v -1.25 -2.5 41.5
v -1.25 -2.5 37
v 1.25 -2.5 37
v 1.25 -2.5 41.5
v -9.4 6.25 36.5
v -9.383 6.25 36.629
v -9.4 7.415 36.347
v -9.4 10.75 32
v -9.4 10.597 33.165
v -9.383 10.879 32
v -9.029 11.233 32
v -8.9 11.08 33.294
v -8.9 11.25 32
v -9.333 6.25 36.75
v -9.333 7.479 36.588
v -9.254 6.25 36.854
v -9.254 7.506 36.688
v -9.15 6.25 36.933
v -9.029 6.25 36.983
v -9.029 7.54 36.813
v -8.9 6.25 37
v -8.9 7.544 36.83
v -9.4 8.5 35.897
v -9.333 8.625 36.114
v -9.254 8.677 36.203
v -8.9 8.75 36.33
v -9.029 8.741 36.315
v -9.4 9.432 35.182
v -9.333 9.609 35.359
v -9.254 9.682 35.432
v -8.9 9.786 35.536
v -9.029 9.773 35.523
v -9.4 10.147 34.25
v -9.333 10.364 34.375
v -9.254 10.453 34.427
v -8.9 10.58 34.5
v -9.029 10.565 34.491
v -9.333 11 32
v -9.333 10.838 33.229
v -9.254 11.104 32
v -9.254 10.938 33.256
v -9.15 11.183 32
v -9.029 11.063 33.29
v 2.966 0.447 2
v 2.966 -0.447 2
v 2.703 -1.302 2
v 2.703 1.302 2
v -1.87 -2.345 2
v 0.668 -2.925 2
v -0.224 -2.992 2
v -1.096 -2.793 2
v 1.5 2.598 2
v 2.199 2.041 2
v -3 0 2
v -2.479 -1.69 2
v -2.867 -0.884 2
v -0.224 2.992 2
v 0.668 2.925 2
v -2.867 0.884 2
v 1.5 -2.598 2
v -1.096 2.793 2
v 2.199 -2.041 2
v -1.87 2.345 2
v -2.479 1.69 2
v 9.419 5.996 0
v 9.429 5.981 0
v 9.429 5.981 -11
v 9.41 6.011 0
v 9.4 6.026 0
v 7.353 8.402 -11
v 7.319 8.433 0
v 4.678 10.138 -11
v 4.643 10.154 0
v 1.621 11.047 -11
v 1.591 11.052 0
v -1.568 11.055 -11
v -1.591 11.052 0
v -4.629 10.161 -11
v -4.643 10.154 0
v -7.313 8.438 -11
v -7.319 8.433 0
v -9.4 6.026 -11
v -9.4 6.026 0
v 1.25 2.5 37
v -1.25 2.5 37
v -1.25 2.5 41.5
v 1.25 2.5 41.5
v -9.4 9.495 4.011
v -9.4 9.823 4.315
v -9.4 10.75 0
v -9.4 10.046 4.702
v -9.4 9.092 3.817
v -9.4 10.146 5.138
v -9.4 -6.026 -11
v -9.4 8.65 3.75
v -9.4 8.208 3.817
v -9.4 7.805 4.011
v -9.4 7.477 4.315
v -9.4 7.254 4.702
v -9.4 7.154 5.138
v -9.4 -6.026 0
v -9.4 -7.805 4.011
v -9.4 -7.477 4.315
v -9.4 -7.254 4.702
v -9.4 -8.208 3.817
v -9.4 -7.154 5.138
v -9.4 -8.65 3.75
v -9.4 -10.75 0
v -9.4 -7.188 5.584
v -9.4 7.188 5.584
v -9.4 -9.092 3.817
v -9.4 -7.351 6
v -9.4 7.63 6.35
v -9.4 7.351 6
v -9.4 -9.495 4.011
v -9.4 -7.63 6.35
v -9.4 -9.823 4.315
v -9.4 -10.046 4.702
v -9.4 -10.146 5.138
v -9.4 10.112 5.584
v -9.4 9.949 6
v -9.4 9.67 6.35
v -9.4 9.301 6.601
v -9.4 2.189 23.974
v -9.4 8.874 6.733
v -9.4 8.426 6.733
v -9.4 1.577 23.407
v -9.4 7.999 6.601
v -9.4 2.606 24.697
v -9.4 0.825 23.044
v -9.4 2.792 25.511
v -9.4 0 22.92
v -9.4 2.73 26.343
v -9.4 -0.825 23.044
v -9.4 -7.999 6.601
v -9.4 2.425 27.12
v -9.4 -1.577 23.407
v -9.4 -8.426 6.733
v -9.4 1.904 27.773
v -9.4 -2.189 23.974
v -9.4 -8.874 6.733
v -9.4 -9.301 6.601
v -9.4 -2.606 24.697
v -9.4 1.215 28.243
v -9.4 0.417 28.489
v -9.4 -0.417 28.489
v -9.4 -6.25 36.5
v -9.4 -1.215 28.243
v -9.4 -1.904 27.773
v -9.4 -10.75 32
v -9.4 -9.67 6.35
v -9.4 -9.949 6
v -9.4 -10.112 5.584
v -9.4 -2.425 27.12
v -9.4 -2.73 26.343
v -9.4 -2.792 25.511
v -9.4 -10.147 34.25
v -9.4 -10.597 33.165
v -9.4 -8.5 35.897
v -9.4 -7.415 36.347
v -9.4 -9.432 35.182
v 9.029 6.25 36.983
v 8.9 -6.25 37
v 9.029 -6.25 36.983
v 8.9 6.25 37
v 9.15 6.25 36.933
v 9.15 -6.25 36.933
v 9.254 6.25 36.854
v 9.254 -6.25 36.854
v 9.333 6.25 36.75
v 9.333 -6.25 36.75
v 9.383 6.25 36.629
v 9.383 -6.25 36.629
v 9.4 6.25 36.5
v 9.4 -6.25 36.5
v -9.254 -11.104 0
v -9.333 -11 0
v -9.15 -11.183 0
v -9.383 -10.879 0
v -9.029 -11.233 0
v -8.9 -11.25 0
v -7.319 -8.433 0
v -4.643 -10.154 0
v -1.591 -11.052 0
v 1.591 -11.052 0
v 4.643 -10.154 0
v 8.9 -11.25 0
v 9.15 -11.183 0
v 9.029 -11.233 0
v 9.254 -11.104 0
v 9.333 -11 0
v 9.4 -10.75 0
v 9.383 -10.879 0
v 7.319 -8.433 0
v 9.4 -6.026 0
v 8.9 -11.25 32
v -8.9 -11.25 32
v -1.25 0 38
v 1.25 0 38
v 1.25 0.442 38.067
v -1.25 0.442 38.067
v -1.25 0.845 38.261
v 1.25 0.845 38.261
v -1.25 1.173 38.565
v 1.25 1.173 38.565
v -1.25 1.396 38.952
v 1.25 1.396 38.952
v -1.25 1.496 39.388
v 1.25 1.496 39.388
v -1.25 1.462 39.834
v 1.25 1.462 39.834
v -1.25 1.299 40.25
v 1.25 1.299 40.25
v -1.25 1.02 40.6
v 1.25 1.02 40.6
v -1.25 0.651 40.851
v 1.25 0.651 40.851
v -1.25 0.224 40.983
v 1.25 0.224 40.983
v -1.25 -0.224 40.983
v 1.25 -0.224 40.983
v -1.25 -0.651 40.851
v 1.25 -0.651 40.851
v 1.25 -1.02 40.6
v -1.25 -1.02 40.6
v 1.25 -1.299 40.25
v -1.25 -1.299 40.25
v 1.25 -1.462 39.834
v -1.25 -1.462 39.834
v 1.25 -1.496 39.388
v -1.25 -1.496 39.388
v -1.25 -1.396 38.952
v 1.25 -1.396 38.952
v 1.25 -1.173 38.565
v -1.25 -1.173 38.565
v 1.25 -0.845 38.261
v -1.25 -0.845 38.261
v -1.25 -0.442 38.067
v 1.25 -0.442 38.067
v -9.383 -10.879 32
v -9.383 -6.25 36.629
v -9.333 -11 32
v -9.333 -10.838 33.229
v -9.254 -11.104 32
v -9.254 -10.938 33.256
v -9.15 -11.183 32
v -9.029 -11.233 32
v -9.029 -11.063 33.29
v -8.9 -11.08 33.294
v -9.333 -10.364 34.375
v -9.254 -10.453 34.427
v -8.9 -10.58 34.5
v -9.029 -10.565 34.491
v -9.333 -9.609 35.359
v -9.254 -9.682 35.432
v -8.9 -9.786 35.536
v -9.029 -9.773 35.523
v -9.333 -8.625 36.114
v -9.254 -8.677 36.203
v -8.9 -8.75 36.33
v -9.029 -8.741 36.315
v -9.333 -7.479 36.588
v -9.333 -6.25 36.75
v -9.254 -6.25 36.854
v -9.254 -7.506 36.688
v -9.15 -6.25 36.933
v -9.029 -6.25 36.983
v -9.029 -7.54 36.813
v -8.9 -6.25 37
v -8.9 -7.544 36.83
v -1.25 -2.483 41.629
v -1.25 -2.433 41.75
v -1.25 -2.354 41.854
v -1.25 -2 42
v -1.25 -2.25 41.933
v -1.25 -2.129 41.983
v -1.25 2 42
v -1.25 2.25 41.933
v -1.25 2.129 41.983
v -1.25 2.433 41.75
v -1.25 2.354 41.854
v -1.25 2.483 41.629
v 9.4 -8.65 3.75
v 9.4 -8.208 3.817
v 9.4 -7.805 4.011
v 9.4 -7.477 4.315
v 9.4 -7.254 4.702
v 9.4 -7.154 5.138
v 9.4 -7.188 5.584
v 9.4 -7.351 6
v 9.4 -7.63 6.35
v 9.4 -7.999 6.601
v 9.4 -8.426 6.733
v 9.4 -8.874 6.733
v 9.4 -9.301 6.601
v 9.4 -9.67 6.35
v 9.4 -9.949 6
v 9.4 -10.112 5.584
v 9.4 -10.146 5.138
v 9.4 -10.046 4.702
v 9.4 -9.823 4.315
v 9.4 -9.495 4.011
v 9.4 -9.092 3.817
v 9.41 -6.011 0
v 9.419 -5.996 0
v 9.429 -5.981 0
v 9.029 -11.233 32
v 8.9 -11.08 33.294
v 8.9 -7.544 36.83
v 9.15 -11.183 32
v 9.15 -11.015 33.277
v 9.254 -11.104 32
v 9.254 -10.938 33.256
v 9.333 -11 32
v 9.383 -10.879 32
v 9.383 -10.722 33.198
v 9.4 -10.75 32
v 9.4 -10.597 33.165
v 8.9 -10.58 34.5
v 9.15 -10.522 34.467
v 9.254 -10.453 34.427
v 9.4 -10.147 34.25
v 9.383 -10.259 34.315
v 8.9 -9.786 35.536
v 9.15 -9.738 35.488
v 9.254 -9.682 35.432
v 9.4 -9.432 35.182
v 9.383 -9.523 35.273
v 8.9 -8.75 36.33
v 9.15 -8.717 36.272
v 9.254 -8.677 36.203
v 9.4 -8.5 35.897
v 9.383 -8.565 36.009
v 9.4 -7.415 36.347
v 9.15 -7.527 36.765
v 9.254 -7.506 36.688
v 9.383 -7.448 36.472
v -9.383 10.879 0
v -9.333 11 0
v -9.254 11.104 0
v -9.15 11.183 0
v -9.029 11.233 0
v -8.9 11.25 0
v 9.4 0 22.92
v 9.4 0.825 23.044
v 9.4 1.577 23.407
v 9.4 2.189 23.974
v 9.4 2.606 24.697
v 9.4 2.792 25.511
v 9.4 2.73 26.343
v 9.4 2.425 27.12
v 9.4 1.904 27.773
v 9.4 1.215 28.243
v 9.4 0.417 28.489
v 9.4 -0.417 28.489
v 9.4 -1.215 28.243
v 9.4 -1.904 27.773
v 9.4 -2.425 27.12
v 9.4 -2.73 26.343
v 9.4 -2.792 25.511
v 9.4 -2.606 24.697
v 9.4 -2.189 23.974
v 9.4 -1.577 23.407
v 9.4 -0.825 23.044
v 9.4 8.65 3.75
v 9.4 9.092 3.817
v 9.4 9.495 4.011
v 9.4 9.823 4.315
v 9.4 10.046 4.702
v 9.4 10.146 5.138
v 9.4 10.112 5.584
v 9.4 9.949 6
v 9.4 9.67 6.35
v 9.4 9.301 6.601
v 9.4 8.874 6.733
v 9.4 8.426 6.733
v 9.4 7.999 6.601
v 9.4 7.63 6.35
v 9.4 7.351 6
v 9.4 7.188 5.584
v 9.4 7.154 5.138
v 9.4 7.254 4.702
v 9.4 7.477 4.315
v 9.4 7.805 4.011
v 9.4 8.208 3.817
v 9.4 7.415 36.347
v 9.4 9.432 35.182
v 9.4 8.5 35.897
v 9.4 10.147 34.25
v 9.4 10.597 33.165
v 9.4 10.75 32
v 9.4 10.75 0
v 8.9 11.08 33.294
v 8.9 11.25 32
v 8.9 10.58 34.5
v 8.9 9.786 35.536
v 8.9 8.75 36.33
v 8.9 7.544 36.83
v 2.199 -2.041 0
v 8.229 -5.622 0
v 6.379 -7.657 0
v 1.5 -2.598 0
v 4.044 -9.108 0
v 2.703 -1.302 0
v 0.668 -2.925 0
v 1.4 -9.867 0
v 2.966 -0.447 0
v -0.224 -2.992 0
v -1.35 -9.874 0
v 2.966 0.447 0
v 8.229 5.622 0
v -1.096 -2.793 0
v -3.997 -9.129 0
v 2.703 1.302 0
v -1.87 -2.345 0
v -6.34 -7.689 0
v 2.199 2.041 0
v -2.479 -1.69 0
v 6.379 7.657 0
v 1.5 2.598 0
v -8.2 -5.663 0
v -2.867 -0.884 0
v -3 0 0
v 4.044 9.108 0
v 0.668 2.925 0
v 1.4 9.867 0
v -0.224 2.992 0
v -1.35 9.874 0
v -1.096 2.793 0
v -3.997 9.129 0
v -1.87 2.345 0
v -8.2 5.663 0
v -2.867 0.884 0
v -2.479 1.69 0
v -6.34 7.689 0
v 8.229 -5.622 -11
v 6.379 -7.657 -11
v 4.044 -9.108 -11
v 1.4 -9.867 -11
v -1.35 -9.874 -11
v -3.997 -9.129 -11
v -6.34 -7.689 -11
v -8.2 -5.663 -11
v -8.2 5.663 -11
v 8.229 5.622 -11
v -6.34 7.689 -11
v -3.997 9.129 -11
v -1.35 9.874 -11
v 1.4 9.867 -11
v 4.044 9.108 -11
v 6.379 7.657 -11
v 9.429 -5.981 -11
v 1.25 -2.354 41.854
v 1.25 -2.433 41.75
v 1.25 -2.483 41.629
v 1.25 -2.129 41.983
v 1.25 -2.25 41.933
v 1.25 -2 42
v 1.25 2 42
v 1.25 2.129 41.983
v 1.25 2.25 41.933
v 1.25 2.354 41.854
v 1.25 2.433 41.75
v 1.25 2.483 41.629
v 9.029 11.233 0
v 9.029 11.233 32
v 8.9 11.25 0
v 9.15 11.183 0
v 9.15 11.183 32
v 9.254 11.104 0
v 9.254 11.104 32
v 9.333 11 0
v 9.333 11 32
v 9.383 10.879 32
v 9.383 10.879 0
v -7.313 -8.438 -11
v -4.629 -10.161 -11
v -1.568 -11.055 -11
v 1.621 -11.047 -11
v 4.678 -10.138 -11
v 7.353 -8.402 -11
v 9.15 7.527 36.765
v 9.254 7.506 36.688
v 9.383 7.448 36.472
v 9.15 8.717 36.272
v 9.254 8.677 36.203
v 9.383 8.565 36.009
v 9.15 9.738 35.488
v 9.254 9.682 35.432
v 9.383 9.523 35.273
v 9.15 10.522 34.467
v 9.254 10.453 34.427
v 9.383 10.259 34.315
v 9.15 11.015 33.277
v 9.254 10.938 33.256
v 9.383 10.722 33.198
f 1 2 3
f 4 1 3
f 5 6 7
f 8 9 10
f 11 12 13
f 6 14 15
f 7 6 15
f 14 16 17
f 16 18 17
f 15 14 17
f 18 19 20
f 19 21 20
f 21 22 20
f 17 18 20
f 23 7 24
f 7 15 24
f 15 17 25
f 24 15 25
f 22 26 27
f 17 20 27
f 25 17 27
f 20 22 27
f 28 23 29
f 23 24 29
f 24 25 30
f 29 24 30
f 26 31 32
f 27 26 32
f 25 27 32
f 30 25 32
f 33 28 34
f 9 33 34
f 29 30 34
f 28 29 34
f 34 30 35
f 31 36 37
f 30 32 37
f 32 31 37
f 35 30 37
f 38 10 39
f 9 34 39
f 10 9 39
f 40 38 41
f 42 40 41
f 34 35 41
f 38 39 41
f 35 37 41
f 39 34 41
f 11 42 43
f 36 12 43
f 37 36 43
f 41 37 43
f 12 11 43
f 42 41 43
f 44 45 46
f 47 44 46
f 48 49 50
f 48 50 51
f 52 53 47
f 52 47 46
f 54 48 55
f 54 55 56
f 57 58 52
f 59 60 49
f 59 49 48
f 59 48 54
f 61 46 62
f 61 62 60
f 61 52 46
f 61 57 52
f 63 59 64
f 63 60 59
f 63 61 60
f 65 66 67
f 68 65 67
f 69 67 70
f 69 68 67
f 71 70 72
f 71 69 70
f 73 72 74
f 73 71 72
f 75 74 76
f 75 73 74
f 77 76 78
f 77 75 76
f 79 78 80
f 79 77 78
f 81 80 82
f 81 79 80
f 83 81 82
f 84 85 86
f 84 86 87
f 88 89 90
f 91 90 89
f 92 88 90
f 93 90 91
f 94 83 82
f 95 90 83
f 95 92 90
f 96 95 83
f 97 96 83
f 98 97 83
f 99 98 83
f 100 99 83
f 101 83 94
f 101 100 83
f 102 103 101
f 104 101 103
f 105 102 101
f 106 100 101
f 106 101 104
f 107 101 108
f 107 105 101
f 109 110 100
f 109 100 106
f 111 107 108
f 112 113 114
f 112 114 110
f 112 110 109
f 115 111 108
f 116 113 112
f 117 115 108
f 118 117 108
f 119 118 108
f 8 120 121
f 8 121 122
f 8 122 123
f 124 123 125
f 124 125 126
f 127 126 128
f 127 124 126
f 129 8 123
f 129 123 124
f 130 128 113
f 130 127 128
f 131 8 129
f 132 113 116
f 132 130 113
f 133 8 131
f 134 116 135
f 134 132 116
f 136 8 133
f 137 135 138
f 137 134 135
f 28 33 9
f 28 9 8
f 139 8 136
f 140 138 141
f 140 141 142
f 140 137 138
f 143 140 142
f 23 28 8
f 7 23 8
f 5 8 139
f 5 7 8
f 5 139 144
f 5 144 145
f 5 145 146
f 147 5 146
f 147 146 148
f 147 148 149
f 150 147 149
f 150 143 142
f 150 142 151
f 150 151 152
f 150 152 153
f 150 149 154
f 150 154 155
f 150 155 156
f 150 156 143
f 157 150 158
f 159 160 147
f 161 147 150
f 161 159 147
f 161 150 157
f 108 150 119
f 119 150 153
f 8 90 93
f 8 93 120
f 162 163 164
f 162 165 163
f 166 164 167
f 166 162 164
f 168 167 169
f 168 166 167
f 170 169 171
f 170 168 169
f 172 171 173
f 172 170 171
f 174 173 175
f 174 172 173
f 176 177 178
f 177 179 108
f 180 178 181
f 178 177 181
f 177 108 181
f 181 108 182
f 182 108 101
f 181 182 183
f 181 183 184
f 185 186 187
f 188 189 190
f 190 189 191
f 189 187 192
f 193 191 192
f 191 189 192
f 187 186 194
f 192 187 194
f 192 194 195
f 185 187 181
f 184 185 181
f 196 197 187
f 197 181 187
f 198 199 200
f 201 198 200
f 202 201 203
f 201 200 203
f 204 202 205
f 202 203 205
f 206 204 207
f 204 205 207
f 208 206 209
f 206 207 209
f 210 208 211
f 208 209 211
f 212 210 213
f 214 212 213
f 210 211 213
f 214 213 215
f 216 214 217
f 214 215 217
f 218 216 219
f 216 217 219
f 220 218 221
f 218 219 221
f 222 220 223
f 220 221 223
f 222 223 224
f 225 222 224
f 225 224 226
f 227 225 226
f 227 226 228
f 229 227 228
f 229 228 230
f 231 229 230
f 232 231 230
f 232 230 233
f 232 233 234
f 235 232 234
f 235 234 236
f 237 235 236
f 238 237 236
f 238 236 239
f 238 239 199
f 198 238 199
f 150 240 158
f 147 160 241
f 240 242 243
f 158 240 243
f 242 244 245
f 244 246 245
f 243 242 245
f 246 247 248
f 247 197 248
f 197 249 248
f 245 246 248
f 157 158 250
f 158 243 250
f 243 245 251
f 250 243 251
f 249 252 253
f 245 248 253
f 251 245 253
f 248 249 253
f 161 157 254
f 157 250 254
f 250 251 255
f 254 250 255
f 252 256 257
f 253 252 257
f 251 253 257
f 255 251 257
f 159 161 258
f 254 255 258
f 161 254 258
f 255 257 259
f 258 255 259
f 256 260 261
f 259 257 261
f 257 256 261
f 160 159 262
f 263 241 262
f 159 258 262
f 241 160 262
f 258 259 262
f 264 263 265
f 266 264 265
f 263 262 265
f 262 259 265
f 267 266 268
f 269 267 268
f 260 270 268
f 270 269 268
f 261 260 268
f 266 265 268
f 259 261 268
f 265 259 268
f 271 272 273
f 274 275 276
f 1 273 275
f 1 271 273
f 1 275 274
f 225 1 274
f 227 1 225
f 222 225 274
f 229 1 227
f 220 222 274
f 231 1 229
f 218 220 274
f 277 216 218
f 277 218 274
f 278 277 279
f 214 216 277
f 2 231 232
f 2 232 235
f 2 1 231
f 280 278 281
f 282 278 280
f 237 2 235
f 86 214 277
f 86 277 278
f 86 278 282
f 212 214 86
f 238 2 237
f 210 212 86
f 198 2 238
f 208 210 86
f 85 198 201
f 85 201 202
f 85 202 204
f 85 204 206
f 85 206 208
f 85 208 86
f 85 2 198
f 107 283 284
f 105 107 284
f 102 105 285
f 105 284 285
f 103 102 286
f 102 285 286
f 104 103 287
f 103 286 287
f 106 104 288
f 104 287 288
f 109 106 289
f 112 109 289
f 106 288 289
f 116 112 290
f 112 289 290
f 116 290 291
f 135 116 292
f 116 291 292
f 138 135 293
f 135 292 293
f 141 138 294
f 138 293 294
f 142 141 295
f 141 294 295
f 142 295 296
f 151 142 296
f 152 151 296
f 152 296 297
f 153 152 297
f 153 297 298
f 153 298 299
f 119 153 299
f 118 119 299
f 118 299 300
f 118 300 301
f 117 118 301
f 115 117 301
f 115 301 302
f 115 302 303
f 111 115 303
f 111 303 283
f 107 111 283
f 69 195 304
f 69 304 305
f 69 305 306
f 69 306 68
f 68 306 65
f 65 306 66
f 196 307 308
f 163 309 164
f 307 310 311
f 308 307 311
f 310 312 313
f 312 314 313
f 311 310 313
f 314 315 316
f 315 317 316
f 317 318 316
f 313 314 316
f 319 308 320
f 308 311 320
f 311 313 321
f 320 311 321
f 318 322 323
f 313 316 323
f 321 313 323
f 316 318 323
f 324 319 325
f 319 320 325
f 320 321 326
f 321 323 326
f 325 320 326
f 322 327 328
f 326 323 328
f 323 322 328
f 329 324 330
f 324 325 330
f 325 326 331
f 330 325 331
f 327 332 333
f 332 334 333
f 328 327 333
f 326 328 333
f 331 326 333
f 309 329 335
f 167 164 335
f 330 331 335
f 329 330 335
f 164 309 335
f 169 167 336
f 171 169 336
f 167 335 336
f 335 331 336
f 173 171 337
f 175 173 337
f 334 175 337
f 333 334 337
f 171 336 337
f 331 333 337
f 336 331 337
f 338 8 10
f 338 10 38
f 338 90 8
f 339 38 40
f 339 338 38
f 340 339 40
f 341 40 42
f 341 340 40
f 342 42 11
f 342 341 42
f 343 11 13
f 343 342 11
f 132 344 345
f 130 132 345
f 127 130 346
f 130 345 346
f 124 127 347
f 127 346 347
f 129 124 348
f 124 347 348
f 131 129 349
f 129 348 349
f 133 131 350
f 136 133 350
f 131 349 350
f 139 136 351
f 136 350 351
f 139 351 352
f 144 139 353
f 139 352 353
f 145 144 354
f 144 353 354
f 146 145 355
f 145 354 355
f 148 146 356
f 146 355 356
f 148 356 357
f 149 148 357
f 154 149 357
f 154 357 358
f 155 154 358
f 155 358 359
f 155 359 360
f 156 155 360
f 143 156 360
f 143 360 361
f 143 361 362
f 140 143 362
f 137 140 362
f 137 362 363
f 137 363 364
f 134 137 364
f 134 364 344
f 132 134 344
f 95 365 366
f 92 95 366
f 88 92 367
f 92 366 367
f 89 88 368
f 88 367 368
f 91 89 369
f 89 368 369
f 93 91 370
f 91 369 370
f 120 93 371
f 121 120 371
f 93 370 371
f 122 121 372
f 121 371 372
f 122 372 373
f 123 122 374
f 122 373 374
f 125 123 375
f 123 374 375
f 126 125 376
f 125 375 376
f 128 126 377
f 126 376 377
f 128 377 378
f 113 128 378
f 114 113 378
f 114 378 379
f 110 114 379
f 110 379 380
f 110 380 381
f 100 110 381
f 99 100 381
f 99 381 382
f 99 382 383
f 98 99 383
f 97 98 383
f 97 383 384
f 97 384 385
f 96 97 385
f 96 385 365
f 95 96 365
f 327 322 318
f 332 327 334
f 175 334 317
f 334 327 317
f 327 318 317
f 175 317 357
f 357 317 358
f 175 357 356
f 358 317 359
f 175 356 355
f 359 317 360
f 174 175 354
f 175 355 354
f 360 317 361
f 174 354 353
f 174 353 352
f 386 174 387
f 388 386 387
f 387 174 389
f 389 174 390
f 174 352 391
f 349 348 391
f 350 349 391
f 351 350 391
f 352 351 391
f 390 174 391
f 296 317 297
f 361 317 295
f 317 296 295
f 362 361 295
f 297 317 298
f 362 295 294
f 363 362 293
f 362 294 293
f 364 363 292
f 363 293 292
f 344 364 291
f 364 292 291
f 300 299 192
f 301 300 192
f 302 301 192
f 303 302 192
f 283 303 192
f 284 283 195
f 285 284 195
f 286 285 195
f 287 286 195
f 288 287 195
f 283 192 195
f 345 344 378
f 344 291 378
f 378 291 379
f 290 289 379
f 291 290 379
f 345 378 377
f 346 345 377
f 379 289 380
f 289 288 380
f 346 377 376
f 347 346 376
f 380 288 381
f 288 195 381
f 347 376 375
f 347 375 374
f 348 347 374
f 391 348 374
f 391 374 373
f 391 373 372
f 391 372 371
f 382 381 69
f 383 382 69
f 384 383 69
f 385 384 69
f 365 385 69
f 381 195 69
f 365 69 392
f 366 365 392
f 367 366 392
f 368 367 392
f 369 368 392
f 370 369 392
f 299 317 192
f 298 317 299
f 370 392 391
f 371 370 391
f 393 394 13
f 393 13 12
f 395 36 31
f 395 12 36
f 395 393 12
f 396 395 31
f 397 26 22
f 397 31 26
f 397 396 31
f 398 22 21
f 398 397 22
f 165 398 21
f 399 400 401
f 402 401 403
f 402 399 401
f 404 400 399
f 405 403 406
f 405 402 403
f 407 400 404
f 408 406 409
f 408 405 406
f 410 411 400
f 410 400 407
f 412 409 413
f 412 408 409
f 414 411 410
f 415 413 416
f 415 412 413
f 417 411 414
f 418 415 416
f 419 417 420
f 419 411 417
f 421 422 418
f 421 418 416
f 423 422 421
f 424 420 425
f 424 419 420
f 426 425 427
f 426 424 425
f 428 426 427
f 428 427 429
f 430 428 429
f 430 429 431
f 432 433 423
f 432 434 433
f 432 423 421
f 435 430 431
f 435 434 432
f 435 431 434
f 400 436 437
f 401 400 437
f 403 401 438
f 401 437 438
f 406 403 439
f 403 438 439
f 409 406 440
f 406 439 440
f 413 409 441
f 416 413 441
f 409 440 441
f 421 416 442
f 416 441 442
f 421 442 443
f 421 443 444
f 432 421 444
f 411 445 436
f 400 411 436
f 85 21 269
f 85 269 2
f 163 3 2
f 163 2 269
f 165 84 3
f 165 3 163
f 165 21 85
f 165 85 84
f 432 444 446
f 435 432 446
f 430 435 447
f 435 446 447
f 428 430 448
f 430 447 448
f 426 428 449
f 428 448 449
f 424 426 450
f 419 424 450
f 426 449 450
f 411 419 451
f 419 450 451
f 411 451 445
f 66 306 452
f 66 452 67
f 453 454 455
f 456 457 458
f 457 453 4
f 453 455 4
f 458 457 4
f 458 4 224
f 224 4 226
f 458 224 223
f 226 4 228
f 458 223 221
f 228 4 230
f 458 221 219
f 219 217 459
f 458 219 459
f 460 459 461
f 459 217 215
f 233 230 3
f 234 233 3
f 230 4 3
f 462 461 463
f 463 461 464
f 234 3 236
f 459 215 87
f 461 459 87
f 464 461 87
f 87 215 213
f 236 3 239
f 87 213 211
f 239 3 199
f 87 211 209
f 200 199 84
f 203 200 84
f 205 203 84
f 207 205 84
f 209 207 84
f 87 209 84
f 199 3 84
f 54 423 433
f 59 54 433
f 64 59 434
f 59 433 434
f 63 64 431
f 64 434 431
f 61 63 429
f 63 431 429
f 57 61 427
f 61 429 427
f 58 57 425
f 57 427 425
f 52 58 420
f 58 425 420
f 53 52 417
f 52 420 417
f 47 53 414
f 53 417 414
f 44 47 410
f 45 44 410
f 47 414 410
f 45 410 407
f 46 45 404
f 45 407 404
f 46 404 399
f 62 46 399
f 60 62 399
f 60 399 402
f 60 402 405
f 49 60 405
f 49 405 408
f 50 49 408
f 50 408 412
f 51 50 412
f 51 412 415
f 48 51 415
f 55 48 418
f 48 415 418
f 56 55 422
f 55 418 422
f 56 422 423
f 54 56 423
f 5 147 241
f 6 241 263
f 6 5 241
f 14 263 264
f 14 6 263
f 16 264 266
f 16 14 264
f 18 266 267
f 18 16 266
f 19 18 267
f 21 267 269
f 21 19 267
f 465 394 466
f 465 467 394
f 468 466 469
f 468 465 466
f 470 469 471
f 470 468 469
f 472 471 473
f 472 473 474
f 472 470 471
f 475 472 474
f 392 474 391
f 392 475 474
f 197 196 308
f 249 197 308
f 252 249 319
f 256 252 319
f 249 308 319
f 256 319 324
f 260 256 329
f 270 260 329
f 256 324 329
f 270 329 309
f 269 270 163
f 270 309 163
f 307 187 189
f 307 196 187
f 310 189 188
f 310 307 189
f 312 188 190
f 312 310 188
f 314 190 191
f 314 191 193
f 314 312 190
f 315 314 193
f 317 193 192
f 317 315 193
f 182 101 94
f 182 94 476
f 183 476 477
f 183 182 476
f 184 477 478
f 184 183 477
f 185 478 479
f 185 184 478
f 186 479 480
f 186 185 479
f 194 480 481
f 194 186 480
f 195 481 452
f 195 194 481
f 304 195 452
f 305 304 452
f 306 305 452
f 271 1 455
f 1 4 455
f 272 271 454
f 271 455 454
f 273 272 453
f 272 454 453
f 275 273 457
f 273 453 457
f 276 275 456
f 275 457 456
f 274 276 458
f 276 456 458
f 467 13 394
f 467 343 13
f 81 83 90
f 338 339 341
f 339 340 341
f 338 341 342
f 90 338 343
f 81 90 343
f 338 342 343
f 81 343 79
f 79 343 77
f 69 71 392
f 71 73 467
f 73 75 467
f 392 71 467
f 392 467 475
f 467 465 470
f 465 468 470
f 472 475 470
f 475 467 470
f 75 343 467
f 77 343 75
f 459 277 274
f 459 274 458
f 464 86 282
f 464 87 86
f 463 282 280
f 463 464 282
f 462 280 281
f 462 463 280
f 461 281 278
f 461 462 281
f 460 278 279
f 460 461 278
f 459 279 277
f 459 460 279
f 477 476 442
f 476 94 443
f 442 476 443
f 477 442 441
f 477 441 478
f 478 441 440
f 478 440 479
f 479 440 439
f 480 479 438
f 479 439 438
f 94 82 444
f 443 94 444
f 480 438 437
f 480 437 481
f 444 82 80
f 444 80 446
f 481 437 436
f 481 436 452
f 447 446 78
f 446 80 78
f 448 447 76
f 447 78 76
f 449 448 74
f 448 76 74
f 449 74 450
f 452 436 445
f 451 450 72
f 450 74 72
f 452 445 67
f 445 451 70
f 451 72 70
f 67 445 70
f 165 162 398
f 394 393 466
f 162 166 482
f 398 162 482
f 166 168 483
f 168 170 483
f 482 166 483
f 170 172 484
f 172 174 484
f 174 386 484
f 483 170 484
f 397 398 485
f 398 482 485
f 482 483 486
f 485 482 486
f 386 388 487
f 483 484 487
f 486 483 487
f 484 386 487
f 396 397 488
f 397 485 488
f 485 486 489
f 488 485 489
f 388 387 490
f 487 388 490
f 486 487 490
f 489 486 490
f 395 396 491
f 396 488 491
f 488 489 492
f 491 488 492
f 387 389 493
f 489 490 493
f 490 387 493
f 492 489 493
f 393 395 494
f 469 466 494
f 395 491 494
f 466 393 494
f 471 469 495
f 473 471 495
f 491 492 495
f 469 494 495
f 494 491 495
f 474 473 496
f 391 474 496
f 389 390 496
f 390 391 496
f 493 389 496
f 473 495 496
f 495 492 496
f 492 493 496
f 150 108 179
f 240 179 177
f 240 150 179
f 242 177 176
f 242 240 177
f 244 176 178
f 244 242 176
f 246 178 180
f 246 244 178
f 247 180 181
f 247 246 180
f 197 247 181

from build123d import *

# Parameters (mm, degrees)
SKETCH1_W           = 18.8
SKETCH1_H           = 22.5
BOSS_EXTRUDE1_DEPTH = 37
BOSS_EXTRUDE2_DEPTH = 11
FILLET1_R           = 5
SKETCH3_R           = 1.5
CUT_EXTRUDE1_DEPTH  = 19.8
SKETCH4_W           = 2.5
SKETCH4_H           = 5
BOSS_EXTRUDE3_DEPTH = 5
FILLET2_R           = 0.5
SKETCH5_R           = 1.5
CUT_EXTRUDE2_DEPTH  = 5
SKETCH6_R           = 2.8
CUT_EXTRUDE3_DEPTH  = 19.8
CUT_EXTRUDE4_DEPTH  = 11
SKETCH8_R           = 3
CUT_EXTRUDE5_DEPTH  = 2


with BuildPart() as part:
    # Sketch1 → Boss-Extrude1 (new body)
    with BuildSketch(Plane.XY):
        Rectangle(SKETCH1_W, SKETCH1_H)
    extrude(amount=BOSS_EXTRUDE1_DEPTH)

    # Sketch2 → Boss-Extrude2 (add)
    with BuildSketch(Plane(origin=(0, 0, 0), x_dir=(-1, 0, 0), z_dir=(0, 0, -1))):
        with BuildLine():
            Line((9.4, 6.025985397), (9.4, -6.025985397))
            ThreePointArc((9.4, -6.025985397), (-0.026782234, -11.165651916), (-9.428799853, -5.980822129))
            Line((-9.428799853, -5.980822129), (-9.428799853, 5.980822129))
            ThreePointArc((-9.428799853, 5.980822129), (-0.026782234, 11.165651916), (9.4, 6.025985397))
        make_face()
    extrude(amount=BOSS_EXTRUDE2_DEPTH)

    # Fillet1
    fillet1_edges = [part.edges().sort_by_distance(p)[0] for p in [
        (0, 11.25, 37),
        (0, -11.25, 37),
    ]]
    fillet(fillet1_edges, radius=FILLET1_R)

    # Sketch3 → Cut-Extrude1 (cut, through all)
    with BuildSketch(Plane(origin=(9.4, 0, 0), x_dir=(0, 0, -1), z_dir=(1, 0, 0))):
        with Locations((-5.25, 8.65)):
            Circle(SKETCH3_R)
        with Locations((-5.25, -8.65)):
            Circle(SKETCH3_R)
    extrude(amount=-CUT_EXTRUDE1_DEPTH, mode=Mode.SUBTRACT)

    # Sketch4 → Boss-Extrude3 (add)
    with BuildSketch(Plane.XY.offset(37)):
        Rectangle(SKETCH4_W, SKETCH4_H)
    extrude(amount=BOSS_EXTRUDE3_DEPTH)

    # Fillet2
    fillet2_edges = [part.edges().sort_by_distance(p)[0] for p in [
        (-9.4, 0, 37),
        (9.4, 0, 37),
        (9.4, 11.25, 16),
        (9.4, -11.25, 16),
        (9.4, 9.785533906, 35.535533906),
        (9.4, -9.785533906, 35.535533906),
        (-9.4, -11.25, 16),
        (-9.4, 11.25, 16),
        (-9.4, 9.785533906, 35.535533906),
        (-9.4, -9.785533906, 35.535533906),
        (0, -2.5, 42),
        (0, 2.5, 42),
    ]]
    fillet(fillet2_edges, radius=FILLET2_R)

    # Sketch5 → Cut-Extrude2 (cut)
    with BuildSketch(Plane(origin=(1.25, 0, 0), x_dir=(0, 0, -1), z_dir=(1, 0, 0))):
        with Locations((-39.5, 0)):
            Circle(SKETCH5_R)
    extrude(amount=-CUT_EXTRUDE2_DEPTH, mode=Mode.SUBTRACT)

    # Sketch6 → Cut-Extrude3 (cut, through all)
    with BuildSketch(Plane(origin=(9.4, 0, 0), x_dir=(0, 0, -1), z_dir=(1, 0, 0))):
        with Locations((-25.72, 0)):
            Circle(SKETCH6_R)
    extrude(amount=-CUT_EXTRUDE3_DEPTH, mode=Mode.SUBTRACT)

    # Sketch7 → Cut-Extrude4 (cut)
    with BuildSketch(Plane(origin=(0, 0, -11), x_dir=(-1, 0, 0), z_dir=(0, 0, -1))):
        with BuildLine():
            Line((-8.228799853, 5.62153994), (-8.228799853, -5.62153994))
            ThreePointArc((-8.228799853, -5.62153994), (-0.025432798, -9.965651584), (8.2, -5.663466987))
            Line((8.2, -5.663466987), (8.2, 5.663466987))
            ThreePointArc((8.2, 5.663466987), (-0.025432798, 9.965651584), (-8.228799853, 5.62153994))
        make_face()
    extrude(amount=-CUT_EXTRUDE4_DEPTH, mode=Mode.SUBTRACT)

    # Sketch8 → Cut-Extrude5 (cut)
    with BuildSketch(Plane(origin=(0, 0, 0), x_dir=(-1, 0, 0), z_dir=(0, 0, -1))):
        Circle(SKETCH8_R)
    extrude(amount=-CUT_EXTRUDE5_DEPTH, mode=Mode.SUBTRACT)


solid = part.part
